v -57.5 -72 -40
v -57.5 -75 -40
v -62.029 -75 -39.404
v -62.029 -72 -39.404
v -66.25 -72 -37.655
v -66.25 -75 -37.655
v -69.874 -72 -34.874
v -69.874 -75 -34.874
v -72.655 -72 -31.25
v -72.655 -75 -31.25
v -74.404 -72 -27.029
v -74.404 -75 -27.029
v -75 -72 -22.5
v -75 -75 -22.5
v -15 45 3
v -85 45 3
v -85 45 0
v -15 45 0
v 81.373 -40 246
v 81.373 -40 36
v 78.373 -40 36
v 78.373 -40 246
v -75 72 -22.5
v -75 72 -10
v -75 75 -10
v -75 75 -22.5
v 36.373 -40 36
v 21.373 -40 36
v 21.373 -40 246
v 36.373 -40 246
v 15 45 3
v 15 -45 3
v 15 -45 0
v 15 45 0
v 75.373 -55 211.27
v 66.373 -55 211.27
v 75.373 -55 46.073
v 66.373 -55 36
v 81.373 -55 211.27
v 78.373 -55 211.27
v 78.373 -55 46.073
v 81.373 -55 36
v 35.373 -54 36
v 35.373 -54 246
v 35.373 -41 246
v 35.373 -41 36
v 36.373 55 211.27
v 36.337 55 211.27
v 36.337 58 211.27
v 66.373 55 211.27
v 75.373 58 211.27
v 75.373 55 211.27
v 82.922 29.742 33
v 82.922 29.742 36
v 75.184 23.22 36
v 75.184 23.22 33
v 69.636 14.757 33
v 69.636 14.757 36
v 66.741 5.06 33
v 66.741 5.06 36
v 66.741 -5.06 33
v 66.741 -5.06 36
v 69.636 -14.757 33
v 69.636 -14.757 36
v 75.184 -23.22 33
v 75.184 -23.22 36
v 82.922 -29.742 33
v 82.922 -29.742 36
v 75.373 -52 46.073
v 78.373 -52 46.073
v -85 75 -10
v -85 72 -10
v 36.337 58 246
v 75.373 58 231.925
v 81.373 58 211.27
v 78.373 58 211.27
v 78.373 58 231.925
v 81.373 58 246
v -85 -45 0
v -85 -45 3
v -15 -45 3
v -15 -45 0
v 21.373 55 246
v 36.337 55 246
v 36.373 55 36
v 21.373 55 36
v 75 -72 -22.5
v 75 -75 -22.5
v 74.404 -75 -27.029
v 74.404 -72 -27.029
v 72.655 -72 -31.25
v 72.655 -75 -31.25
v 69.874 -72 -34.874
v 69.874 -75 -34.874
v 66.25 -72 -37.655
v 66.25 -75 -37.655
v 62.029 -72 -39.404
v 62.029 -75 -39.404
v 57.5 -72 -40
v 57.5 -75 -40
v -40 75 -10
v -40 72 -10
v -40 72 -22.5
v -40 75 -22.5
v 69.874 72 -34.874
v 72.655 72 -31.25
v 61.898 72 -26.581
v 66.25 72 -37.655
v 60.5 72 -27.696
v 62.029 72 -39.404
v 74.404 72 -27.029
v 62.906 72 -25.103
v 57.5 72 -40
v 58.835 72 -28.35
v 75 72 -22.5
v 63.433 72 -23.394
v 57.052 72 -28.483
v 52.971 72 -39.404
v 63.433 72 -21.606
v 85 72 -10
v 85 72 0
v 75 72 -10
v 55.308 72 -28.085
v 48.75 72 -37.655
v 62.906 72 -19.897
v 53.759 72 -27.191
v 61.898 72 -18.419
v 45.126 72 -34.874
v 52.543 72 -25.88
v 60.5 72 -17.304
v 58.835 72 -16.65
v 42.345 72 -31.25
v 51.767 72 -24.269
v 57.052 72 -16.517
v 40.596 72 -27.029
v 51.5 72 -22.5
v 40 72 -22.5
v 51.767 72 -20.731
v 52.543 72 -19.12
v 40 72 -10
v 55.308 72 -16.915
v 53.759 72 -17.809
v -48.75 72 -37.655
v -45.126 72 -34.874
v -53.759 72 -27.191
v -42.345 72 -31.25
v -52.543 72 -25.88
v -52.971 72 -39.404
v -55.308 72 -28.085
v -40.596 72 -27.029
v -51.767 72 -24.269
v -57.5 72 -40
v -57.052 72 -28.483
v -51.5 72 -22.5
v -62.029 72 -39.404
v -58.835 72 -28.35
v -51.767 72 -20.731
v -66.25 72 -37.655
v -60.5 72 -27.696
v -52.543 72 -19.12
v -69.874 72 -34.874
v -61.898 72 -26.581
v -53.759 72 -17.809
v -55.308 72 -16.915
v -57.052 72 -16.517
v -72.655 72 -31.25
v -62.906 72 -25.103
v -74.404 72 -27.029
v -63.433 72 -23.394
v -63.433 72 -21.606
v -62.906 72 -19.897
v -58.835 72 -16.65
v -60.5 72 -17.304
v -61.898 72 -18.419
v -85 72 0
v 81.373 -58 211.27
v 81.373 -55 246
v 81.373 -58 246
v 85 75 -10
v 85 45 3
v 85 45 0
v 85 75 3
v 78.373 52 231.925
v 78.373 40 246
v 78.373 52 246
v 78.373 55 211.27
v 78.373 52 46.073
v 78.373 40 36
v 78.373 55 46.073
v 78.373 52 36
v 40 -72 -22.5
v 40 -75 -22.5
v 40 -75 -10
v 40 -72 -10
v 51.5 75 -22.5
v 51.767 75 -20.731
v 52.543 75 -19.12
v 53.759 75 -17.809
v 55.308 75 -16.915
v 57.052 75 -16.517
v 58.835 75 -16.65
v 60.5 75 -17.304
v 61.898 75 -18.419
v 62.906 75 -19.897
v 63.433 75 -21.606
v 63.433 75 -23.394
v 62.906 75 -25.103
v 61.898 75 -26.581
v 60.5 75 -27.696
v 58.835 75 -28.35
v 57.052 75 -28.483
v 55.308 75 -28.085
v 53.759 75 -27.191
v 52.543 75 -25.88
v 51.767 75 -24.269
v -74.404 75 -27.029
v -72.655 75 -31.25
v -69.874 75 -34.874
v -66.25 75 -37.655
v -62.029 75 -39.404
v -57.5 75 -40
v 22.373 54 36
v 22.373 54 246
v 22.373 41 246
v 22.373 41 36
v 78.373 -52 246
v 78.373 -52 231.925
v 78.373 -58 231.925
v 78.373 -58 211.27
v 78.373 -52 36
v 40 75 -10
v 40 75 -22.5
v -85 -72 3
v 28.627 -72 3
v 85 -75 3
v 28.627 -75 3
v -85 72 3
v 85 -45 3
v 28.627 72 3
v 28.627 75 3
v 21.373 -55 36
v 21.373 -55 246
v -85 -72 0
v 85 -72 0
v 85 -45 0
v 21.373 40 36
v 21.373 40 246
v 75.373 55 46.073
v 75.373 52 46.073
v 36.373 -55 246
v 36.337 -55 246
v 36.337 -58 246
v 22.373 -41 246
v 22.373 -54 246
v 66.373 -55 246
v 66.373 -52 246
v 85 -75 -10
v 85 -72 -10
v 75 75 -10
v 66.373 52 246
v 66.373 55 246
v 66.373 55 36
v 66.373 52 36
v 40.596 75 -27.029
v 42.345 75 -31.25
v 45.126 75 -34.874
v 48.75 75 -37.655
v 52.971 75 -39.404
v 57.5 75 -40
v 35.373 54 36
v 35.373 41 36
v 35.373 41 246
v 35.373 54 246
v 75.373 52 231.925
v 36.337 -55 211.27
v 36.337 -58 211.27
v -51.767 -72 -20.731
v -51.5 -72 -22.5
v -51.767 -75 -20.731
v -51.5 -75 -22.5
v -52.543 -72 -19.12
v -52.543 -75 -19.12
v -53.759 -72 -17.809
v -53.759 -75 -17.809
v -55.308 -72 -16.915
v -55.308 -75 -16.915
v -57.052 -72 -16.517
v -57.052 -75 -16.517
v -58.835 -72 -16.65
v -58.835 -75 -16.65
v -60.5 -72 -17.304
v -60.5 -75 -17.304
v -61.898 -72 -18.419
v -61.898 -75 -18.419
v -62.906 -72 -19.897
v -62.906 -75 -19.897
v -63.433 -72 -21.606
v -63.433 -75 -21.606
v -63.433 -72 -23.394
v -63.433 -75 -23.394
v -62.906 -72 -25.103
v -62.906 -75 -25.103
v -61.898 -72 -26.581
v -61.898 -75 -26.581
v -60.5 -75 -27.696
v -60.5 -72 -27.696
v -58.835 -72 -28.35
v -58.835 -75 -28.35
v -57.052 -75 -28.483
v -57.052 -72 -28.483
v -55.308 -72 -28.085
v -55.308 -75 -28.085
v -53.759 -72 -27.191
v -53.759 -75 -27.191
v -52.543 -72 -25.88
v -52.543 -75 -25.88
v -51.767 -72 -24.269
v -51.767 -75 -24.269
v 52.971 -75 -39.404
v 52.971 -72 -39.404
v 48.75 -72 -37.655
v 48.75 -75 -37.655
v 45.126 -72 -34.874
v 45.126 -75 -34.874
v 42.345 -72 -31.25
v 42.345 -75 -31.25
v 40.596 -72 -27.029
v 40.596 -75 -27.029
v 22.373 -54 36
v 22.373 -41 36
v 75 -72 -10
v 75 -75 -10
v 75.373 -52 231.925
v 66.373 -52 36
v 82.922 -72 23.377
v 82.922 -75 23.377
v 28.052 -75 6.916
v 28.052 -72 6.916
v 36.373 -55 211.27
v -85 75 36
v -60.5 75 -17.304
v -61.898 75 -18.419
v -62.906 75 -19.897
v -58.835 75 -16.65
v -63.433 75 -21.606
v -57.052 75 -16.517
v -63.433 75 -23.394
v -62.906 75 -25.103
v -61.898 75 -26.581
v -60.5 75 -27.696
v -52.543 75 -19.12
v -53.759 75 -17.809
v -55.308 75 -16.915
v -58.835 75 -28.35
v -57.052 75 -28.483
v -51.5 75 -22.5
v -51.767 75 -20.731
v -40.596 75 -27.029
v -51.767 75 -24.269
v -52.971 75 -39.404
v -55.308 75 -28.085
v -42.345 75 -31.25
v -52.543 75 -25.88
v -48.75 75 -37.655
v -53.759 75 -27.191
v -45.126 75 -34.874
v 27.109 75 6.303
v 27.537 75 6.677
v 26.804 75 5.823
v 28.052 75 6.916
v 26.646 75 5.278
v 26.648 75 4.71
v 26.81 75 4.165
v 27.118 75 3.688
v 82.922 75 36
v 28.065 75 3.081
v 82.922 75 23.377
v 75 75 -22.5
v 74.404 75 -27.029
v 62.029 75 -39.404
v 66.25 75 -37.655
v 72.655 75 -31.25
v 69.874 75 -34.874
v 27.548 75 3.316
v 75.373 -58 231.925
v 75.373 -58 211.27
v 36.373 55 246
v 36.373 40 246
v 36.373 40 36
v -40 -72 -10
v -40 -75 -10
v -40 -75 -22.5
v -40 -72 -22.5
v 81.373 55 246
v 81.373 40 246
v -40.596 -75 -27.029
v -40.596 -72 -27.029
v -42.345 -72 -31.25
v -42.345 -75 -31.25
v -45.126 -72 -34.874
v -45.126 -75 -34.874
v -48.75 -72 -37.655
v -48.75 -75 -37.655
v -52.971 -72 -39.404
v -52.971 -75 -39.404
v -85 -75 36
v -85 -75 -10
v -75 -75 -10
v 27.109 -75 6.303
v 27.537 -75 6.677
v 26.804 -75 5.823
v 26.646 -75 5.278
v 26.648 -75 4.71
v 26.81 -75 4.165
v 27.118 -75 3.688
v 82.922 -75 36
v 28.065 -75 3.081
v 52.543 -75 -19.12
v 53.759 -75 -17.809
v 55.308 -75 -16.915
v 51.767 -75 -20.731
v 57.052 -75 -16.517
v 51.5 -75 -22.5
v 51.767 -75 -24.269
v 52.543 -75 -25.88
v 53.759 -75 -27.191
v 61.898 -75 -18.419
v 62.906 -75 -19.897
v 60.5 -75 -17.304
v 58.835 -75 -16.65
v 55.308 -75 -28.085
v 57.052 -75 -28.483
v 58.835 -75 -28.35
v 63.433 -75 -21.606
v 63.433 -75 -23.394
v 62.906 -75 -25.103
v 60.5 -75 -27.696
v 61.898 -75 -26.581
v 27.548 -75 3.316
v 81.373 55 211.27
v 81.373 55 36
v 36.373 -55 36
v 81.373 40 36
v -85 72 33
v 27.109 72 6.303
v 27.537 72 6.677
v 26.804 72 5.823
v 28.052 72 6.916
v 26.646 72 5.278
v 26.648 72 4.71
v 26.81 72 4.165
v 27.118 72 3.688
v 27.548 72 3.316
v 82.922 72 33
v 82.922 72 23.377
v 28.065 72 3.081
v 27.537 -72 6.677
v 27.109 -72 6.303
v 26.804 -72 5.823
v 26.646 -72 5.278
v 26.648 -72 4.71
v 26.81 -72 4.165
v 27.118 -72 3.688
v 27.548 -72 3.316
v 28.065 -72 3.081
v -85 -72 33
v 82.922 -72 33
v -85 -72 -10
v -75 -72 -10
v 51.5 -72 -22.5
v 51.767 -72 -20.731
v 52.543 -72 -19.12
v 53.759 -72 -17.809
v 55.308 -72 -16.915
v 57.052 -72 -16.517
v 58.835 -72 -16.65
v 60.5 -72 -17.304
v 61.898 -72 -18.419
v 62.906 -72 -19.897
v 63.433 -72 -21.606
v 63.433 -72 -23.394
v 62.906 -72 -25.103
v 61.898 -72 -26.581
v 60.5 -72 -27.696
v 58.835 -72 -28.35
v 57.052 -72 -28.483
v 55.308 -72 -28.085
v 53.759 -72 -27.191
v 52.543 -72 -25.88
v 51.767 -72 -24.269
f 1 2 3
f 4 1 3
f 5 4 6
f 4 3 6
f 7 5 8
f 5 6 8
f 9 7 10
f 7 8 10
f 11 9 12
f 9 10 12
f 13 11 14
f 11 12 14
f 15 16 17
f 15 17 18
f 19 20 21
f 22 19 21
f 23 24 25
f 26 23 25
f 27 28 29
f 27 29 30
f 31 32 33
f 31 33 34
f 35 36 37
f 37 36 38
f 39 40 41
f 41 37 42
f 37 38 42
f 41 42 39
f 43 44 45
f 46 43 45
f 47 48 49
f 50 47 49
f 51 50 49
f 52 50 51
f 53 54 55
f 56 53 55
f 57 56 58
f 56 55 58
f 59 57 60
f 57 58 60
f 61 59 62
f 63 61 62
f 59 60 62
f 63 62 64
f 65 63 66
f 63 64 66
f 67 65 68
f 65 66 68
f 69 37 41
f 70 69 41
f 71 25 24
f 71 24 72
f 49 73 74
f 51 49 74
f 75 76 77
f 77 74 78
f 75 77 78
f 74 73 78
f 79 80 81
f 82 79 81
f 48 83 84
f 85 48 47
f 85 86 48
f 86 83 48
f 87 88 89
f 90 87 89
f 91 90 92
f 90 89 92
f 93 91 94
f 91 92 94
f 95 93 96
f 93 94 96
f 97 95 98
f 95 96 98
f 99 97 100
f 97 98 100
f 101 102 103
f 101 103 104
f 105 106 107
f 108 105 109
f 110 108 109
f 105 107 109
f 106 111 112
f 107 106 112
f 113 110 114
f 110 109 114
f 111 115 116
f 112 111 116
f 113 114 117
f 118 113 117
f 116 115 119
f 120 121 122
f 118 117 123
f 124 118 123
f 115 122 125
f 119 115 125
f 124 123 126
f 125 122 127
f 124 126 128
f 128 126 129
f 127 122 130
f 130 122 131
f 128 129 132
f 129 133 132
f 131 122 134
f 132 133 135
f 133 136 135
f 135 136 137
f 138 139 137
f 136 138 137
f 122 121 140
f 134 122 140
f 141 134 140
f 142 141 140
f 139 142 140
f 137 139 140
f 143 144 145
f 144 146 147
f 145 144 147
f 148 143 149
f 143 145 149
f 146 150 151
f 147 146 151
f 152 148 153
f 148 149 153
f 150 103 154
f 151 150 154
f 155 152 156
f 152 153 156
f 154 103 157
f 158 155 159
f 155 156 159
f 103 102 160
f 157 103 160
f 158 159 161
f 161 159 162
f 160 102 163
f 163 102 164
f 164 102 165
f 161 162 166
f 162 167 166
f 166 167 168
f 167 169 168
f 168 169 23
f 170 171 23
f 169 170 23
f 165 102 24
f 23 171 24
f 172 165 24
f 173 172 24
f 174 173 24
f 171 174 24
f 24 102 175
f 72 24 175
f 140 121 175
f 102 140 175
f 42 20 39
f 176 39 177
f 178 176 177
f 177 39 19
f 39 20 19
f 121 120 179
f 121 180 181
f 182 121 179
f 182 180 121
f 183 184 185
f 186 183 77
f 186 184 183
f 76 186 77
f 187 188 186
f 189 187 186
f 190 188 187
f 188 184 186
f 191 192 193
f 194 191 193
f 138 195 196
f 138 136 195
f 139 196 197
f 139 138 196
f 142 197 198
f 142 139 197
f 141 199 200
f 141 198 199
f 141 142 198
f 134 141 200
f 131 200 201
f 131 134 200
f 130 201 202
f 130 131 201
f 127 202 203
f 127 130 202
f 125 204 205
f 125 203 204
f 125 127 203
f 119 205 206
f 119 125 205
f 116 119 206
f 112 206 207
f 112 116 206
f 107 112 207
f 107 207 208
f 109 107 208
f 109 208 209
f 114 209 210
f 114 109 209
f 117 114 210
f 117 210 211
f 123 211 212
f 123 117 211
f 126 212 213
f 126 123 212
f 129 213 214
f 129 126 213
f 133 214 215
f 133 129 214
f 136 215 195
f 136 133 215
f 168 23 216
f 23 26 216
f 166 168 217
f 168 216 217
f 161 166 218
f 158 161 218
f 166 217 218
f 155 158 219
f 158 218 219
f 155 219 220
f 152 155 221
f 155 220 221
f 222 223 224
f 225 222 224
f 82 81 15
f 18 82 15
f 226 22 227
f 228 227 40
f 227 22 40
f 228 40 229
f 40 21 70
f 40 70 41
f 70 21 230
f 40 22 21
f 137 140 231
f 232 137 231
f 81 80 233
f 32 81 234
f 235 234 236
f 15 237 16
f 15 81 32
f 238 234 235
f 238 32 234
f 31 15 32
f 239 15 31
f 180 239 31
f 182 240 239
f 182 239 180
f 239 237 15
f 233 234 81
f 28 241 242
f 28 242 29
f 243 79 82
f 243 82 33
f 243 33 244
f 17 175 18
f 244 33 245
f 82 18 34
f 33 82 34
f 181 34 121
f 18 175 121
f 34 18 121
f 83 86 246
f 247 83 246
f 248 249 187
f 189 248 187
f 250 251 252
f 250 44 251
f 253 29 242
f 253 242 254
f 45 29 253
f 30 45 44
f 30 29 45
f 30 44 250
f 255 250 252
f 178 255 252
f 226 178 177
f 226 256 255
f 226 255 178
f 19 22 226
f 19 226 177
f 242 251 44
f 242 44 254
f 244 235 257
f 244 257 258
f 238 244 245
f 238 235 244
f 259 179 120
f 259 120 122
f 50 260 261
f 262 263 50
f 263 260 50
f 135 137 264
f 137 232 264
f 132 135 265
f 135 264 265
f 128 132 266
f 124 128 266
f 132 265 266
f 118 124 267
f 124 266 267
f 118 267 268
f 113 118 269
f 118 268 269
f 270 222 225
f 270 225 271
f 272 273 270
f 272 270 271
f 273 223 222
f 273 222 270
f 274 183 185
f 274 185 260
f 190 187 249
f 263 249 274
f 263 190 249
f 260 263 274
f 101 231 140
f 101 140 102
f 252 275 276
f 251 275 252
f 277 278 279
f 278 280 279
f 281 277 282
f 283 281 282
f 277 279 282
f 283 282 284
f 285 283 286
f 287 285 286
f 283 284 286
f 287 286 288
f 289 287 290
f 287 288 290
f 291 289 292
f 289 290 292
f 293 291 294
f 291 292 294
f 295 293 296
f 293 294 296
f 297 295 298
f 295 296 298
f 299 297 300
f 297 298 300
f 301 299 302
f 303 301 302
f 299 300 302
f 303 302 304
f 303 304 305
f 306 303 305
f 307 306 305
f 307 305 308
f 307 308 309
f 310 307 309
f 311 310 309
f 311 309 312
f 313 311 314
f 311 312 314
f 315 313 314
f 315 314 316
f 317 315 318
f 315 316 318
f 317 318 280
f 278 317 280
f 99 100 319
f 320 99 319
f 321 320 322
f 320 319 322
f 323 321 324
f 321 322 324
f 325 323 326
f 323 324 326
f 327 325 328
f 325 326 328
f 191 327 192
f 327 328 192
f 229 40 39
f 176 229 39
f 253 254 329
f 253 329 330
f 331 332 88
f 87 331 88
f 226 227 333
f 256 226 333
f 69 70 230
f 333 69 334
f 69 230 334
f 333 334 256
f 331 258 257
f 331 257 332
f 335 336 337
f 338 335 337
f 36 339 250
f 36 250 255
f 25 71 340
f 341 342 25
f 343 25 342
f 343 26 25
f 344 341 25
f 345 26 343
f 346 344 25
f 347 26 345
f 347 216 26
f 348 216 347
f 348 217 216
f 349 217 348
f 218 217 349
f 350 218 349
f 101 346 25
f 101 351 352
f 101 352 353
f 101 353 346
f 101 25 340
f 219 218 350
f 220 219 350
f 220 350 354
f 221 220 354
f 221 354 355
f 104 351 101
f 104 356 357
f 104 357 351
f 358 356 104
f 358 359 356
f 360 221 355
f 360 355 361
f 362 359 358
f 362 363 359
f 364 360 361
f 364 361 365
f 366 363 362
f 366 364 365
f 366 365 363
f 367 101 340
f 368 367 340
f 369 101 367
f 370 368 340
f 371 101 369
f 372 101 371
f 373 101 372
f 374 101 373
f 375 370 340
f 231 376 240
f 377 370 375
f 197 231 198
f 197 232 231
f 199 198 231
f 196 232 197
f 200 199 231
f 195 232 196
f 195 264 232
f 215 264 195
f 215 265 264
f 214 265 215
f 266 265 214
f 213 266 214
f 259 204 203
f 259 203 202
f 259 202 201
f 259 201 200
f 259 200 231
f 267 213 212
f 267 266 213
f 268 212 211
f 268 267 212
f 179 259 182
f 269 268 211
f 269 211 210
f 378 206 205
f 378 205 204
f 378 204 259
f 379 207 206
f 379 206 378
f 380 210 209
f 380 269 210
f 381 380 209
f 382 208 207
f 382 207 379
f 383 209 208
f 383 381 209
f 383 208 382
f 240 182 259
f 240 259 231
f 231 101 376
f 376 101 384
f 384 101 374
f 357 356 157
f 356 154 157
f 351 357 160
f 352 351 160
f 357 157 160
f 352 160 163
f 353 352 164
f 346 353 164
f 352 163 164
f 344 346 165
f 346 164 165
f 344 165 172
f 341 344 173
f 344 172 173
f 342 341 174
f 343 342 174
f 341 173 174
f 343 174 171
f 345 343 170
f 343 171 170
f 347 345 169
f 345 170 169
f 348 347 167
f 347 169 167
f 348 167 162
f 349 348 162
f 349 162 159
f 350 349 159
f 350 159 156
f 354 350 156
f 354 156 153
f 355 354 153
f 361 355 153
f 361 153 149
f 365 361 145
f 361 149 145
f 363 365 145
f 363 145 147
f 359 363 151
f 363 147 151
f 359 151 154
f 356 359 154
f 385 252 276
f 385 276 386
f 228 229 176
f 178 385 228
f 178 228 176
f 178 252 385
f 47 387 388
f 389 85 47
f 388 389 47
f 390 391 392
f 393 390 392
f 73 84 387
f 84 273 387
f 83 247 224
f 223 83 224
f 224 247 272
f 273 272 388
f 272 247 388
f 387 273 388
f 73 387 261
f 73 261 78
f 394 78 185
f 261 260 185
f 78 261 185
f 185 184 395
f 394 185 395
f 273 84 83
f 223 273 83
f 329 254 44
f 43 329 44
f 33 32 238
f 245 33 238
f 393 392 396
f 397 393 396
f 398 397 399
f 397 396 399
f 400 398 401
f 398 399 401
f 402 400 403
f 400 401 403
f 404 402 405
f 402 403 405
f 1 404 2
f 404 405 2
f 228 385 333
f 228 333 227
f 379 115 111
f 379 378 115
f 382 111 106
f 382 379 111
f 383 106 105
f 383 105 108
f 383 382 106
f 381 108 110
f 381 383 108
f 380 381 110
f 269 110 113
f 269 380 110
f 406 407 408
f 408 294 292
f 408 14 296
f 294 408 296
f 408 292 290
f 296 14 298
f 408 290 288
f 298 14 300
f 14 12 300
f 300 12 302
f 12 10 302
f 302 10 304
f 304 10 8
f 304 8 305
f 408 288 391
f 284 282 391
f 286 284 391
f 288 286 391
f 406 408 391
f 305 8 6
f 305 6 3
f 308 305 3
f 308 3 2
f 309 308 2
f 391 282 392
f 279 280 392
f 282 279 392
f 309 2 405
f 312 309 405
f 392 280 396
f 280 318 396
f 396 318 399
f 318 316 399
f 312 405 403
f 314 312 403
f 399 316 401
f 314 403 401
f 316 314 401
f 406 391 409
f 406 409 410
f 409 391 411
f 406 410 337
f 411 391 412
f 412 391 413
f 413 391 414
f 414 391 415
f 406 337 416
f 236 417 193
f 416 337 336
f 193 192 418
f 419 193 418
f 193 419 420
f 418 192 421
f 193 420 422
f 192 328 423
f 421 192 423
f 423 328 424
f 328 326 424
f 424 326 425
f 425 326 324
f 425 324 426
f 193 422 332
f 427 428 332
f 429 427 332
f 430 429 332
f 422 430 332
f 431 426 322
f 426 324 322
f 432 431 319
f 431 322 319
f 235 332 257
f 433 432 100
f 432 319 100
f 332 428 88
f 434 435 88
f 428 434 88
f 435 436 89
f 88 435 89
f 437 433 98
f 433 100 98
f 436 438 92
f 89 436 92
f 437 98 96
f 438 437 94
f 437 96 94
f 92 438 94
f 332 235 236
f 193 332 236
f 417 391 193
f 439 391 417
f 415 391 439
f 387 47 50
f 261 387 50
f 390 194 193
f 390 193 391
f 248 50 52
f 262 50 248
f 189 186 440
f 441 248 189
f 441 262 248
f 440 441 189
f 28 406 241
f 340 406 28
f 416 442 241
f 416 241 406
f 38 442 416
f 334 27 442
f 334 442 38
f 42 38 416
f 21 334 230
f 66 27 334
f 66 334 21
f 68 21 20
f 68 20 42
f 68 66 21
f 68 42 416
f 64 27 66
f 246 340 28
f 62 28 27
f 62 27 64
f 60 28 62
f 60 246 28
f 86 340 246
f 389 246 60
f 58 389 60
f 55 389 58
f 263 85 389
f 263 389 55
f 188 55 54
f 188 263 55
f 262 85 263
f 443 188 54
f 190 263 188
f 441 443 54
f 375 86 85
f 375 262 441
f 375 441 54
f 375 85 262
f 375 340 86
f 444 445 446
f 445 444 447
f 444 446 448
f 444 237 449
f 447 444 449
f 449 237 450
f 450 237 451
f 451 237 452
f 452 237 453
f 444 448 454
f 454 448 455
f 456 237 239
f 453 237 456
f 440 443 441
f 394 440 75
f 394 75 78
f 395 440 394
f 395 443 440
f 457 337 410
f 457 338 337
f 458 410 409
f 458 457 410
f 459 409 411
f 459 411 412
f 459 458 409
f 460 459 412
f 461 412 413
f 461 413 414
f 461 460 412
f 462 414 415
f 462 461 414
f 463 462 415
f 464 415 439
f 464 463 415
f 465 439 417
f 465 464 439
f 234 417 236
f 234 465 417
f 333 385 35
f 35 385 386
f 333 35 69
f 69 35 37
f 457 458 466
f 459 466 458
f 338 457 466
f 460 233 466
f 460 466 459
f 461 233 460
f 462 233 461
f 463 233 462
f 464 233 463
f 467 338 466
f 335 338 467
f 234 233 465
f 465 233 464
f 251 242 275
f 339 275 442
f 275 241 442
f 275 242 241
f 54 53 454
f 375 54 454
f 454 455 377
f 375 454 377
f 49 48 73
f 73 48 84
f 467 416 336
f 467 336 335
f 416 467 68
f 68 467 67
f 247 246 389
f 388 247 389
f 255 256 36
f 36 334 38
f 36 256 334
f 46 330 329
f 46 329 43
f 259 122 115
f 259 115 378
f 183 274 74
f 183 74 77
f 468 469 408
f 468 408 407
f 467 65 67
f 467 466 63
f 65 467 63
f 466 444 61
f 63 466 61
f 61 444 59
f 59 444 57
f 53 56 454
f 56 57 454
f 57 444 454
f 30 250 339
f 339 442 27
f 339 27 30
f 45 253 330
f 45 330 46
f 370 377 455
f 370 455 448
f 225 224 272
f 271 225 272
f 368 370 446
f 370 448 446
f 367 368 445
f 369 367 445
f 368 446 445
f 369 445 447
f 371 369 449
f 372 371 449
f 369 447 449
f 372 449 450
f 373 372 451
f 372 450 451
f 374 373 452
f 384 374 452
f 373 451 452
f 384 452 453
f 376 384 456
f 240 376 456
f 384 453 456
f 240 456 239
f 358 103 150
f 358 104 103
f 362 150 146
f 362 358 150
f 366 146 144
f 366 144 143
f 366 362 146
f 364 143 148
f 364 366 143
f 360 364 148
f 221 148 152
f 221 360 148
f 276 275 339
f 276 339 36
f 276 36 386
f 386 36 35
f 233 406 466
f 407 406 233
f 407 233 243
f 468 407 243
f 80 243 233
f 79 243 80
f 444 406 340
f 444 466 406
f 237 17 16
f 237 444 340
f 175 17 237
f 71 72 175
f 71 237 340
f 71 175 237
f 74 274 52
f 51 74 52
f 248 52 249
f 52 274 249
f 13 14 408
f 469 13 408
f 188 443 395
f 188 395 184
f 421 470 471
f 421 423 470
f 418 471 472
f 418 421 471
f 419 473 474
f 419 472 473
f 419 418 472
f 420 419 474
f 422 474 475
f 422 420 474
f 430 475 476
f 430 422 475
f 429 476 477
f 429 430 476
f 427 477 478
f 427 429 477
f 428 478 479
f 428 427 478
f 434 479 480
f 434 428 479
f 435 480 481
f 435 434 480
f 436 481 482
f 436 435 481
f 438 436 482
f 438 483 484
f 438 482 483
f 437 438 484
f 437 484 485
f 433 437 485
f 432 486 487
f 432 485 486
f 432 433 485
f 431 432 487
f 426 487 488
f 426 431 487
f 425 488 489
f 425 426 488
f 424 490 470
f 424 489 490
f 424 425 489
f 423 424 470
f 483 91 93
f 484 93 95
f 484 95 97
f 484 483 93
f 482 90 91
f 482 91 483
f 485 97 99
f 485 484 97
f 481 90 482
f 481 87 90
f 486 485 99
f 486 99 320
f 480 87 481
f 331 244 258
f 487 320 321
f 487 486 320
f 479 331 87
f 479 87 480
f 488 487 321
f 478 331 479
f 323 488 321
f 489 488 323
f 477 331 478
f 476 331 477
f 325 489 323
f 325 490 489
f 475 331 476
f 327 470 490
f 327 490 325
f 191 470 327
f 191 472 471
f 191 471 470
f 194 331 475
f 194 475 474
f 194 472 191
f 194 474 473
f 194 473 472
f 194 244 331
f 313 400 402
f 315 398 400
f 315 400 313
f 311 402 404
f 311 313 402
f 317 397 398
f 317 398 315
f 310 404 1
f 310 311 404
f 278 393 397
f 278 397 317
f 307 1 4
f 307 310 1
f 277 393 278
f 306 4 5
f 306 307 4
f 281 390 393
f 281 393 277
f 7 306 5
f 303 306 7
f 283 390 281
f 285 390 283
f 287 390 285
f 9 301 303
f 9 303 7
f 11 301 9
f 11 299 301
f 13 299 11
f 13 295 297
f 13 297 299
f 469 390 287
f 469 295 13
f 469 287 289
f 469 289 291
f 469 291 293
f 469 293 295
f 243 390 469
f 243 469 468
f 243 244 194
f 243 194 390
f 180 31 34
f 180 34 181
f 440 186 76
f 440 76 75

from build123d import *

# Parameters (mm, degrees)
SKETCH1_W               = 170
SKETCH1_H               = 150
BOSS_EXTRUDE1_DEPTH     = 3
SKETCH2_W               = 170
SKETCH2_H               = 3
BOSS_EXTRUDE3_DEPTH     = 10
SKETCH3_W               = 35
SKETCH3_H               = 3
BOSS_EXTRUDE4_DEPTH     = 30
FILLET1_R               = 17.5
FILLET1_OF_MIRROR2_R    = 17.5
MIRROR3_START           = -75
MIRROR3_DEPTH           = 3
SKETCH7_W               = 70
SKETCH7_H               = 90
CUT_EXTRUDE1_DEPTH      = 3
SKETCH12_R              = 6
CUT_EXTRUDE2_DEPTH      = 175.453432182
BOSS_EXTRUDE5_DEPTH     = 3
FILLET2_R               = 2
FILLET3_R               = 2
FILLET2_OF_MIRROR5_R    = 2
FILLET3_OF_MIRROR5_R    = 2
SKETCH13_W              = 186.373128994
SKETCH13_H              = 150
BOSS_EXTRUDE6_DEPTH     = 3
SKETCH14_W              = 15
SKETCH14_H              = 15
SKETCH14_W_2            = 13
SKETCH14_H_2            = 13
BOSS_EXTRUDE8_DEPTH     = 210
SKETCH16_W              = 45.036207967
SKETCH16_H              = 34.729984481
BOSS_EXTRUDE9_DEPTH     = 3
CUT_EXTRUDE3_DEPTH      = 10
CUT_EXTRUDE3_DEPTH_BACK = 150
SKETCH17_W              = 3
SKETCH17_H              = 185.851643629
SKETCH18_R              = 35
CUT_EXTRUDE4_DEPTH      = 44
CUT_EXTRUDE6_DEPTH      = 2
CUT_EXTRUDE6_DEPTH_BACK = 17
SKETCH19_W              = 29.178069821
SKETCH19_H              = 150


# Read off the part's stored shape, not the designer's step: Mirror3
with BuildPart() as part:
    # Sketch1 → Boss-Extrude1 (new body)
    with BuildSketch(Plane.XY):
        Rectangle(SKETCH1_W, SKETCH1_H)
    extrude(amount=BOSS_EXTRUDE1_DEPTH)

    # Sketch2 → Boss-Extrude3 (add)
    with BuildSketch(Plane(origin=(0, 0, 0), x_dir=(-1, 0, 0), z_dir=(0, 0, -1))):
        with Locations((0, 73.5)):
            Rectangle(SKETCH2_W, SKETCH2_H)
        with Locations((0, -73.5)):
            Rectangle(SKETCH2_W, SKETCH2_H)
    extrude(amount=BOSS_EXTRUDE3_DEPTH)

    # Sketch3 → Boss-Extrude4 (add)
    with BuildSketch(Plane(origin=(0, 0, -10), x_dir=(-1, 0, 0), z_dir=(0, 0, -1))):
        with Locations((57.5, 73.5)):
            Rectangle(SKETCH3_W, SKETCH3_H)
    boss_extrude4 = extrude(amount=BOSS_EXTRUDE4_DEPTH)

    # Fillet1
    fillet1_edges = [part.edges().sort_by_distance(p)[0] for p in [
        (-40, 73.5, -40),
        (-75, 73.5, -40),
    ]]
    fillet(fillet1_edges, radius=FILLET1_R - 0.0001)  # a hair under: the kernel refuses the full size

    # Mirror2: Boss-Extrude4 across plane
    add(boss_extrude4.mirror(Plane(origin=(0, 0, 0), x_dir=(0, 0, 1), z_dir=(1, 0, 0))))

    # Fillet1 of Mirror2
    fillet1_of_mirror2_edges = [part.edges().sort_by_distance(p)[0] for p in [
        (40, 73.5, -40),
        (75, 73.5, -40),
    ]]
    fillet(fillet1_of_mirror2_edges, radius=FILLET1_OF_MIRROR2_R - 0.0001)  # a hair under: the kernel refuses the full size

    # Mirror3 outline → Mirror3 (add)
    with BuildSketch(Plane(origin=(0, 0, 0), x_dir=(1, 0, 0), z_dir=(0, 1, 0)).offset(MIRROR3_START)):
        with BuildLine():
            ThreePointArc((-57.5, 40), (-69.874368671, 34.874368671), (-75, 22.5))
            Line((-75, 22.5), (-75, 10))
            Line((-75, 10), (-40, 10))
            Line((-40, 10), (-40, 22.5))
            ThreePointArc((-40, 22.5), (-45.125631329, 34.874368671), (-57.5, 40))
        make_face()
        with BuildLine():
            Line((40, 22.5), (40, 10))
            Line((40, 10), (75, 10))
            Line((75, 10), (75, 22.5))
            ThreePointArc((75, 22.5), (69.874368671, 34.874368671), (57.5, 40))
            ThreePointArc((57.5, 40), (45.125631329, 34.874368671), (40, 22.5))
        make_face()
    extrude(amount=MIRROR3_DEPTH)

    # Sketch7 → Cut-Extrude1 (cut)
    with BuildSketch(Plane.XY.offset(3)):
        with Locations((-50, 0)):
            Rectangle(SKETCH7_W, SKETCH7_H)
        with Locations((50, 0)):
            Rectangle(SKETCH7_W, SKETCH7_H)
    extrude(amount=-CUT_EXTRUDE1_DEPTH, mode=Mode.SUBTRACT)

    # Sketch12 → Cut-Extrude2 (cut, symmetric)
    with BuildSketch(Plane.XZ.offset(-72)):
        with Locations((-57.5, -22.5)):
            Circle(SKETCH12_R)
    cut_extrude2 = extrude(amount=CUT_EXTRUDE2_DEPTH, both=True, mode=Mode.SUBTRACT)

    # Mirror4: Cut-Extrude2 across plane
    add(cut_extrude2.mirror(Plane(origin=(0, 0, 0), x_dir=(0, 0, 1), z_dir=(1, 0, 0))), mode=Mode.SUBTRACT)

    # Sketch10 → Boss-Extrude5 (add)
    with BuildSketch(Plane(origin=(0, 75, 0), x_dir=(1, 0, 0), z_dir=(0, 1, 0))):
        Polygon((15, -3), (-85, -3), (-85, -33), (115, -33), align=None)
    boss_extrude5 = extrude(amount=-BOSS_EXTRUDE5_DEPTH)

    # Fillet2
    fillet2_edges = [part.edges().sort_by_distance(p)[0] for p in [
        (115, 73.5, 33),
    ]]
    fillet(fillet2_edges, radius=FILLET2_R)

    # Fillet3
    fillet3_edges = [part.edges().sort_by_distance(p)[0] for p in [
        (15, 73.5, 3),
    ]]
    fillet(fillet3_edges, radius=FILLET3_R)

    # Mirror5: Boss-Extrude5 across plane
    add(boss_extrude5.mirror(Plane.ZX))

    # Fillet2 of Mirror5
    fillet2_of_mirror5_edges = [part.edges().sort_by_distance(p)[0] for p in [
        (115, -73.5, 33),
    ]]
    fillet(fillet2_of_mirror5_edges, radius=FILLET2_OF_MIRROR5_R)

    # Fillet3 of Mirror5
    fillet3_of_mirror5_edges = [part.edges().sort_by_distance(p)[0] for p in [
        (15, -73.5, 3),
    ]]
    fillet(fillet3_of_mirror5_edges, radius=FILLET3_OF_MIRROR5_R)

    # Sketch13 → Boss-Extrude6 (add)
    with BuildSketch(Plane.XY.offset(33)):
        with Locations((8.186564497, 0)):
            Rectangle(SKETCH13_W, SKETCH13_H)
    extrude(amount=BOSS_EXTRUDE6_DEPTH)

    # Sketch14 → Boss-Extrude8 (add)
    # profile 1 of 2: a face of its own
    with BuildSketch(Plane.XY.offset(36)):
        with Locations((28.873128994, -47.5)):
            Rectangle(SKETCH14_W, SKETCH14_H)
        with Locations((28.873128994, -47.5)):
            Rectangle(SKETCH14_W_2, SKETCH14_H_2, mode=Mode.SUBTRACT)
    # profile 2 of 2: a face of its own
    with BuildSketch(Plane.XY.offset(36)):
        Polygon((66.373128994, -55), (81.373128994, -55), (81.373128994, -40), (78.373128994, -40), (78.373128994, -52), (66.373128994, -52), align=None)
    boss_extrude8 = extrude(amount=BOSS_EXTRUDE8_DEPTH)

    # Mirror7: Boss-Extrude8 across plane
    add(boss_extrude8.mirror(Plane.ZX))

    # Sketch16 → Boss-Extrude9 (add)
    with BuildSketch(Plane.XZ.offset(55)):
        with Locations((58.855025011, 228.63500776)):
            Rectangle(SKETCH16_W, SKETCH16_H)
    boss_extrude9 = extrude(amount=BOSS_EXTRUDE9_DEPTH)

    # Mirror8: Boss-Extrude9 across plane
    add(boss_extrude9.mirror(Plane.ZX))

    # Sketch17 → Cut-Extrude3 (cut, two sides: drawn at the far end of the back side and taken through both)
    with BuildSketch(Plane(origin=(0, 55, 0), x_dir=(1, 0, 0), z_dir=(0, 1, 0)).offset(-CUT_EXTRUDE3_DEPTH_BACK)):
        with Locations((76.873128994, -138.999103357)):
            Rectangle(SKETCH17_W, SKETCH17_H)
    extrude(amount=CUT_EXTRUDE3_DEPTH + CUT_EXTRUDE3_DEPTH_BACK, mode=Mode.SUBTRACT)

    # Sketch18 → Cut-Extrude4 (cut)
    with BuildSketch(Plane.XY.offset(36)):
        with Locations((101.373128994, 0)):
            Circle(SKETCH18_R)
    extrude(amount=-CUT_EXTRUDE4_DEPTH, mode=Mode.SUBTRACT)

    # Sketch19 → Cut-Extrude6 (cut, two sides: drawn at the far end of the back side and taken through both)
    with BuildSketch(Plane.XY.offset(36).offset(-CUT_EXTRUDE6_DEPTH_BACK)):
        with Locations((97.511085228, 0)):
            Rectangle(SKETCH19_W, SKETCH19_H)
    extrude(amount=CUT_EXTRUDE6_DEPTH + CUT_EXTRUDE6_DEPTH_BACK, mode=Mode.SUBTRACT)


solid = part.part
